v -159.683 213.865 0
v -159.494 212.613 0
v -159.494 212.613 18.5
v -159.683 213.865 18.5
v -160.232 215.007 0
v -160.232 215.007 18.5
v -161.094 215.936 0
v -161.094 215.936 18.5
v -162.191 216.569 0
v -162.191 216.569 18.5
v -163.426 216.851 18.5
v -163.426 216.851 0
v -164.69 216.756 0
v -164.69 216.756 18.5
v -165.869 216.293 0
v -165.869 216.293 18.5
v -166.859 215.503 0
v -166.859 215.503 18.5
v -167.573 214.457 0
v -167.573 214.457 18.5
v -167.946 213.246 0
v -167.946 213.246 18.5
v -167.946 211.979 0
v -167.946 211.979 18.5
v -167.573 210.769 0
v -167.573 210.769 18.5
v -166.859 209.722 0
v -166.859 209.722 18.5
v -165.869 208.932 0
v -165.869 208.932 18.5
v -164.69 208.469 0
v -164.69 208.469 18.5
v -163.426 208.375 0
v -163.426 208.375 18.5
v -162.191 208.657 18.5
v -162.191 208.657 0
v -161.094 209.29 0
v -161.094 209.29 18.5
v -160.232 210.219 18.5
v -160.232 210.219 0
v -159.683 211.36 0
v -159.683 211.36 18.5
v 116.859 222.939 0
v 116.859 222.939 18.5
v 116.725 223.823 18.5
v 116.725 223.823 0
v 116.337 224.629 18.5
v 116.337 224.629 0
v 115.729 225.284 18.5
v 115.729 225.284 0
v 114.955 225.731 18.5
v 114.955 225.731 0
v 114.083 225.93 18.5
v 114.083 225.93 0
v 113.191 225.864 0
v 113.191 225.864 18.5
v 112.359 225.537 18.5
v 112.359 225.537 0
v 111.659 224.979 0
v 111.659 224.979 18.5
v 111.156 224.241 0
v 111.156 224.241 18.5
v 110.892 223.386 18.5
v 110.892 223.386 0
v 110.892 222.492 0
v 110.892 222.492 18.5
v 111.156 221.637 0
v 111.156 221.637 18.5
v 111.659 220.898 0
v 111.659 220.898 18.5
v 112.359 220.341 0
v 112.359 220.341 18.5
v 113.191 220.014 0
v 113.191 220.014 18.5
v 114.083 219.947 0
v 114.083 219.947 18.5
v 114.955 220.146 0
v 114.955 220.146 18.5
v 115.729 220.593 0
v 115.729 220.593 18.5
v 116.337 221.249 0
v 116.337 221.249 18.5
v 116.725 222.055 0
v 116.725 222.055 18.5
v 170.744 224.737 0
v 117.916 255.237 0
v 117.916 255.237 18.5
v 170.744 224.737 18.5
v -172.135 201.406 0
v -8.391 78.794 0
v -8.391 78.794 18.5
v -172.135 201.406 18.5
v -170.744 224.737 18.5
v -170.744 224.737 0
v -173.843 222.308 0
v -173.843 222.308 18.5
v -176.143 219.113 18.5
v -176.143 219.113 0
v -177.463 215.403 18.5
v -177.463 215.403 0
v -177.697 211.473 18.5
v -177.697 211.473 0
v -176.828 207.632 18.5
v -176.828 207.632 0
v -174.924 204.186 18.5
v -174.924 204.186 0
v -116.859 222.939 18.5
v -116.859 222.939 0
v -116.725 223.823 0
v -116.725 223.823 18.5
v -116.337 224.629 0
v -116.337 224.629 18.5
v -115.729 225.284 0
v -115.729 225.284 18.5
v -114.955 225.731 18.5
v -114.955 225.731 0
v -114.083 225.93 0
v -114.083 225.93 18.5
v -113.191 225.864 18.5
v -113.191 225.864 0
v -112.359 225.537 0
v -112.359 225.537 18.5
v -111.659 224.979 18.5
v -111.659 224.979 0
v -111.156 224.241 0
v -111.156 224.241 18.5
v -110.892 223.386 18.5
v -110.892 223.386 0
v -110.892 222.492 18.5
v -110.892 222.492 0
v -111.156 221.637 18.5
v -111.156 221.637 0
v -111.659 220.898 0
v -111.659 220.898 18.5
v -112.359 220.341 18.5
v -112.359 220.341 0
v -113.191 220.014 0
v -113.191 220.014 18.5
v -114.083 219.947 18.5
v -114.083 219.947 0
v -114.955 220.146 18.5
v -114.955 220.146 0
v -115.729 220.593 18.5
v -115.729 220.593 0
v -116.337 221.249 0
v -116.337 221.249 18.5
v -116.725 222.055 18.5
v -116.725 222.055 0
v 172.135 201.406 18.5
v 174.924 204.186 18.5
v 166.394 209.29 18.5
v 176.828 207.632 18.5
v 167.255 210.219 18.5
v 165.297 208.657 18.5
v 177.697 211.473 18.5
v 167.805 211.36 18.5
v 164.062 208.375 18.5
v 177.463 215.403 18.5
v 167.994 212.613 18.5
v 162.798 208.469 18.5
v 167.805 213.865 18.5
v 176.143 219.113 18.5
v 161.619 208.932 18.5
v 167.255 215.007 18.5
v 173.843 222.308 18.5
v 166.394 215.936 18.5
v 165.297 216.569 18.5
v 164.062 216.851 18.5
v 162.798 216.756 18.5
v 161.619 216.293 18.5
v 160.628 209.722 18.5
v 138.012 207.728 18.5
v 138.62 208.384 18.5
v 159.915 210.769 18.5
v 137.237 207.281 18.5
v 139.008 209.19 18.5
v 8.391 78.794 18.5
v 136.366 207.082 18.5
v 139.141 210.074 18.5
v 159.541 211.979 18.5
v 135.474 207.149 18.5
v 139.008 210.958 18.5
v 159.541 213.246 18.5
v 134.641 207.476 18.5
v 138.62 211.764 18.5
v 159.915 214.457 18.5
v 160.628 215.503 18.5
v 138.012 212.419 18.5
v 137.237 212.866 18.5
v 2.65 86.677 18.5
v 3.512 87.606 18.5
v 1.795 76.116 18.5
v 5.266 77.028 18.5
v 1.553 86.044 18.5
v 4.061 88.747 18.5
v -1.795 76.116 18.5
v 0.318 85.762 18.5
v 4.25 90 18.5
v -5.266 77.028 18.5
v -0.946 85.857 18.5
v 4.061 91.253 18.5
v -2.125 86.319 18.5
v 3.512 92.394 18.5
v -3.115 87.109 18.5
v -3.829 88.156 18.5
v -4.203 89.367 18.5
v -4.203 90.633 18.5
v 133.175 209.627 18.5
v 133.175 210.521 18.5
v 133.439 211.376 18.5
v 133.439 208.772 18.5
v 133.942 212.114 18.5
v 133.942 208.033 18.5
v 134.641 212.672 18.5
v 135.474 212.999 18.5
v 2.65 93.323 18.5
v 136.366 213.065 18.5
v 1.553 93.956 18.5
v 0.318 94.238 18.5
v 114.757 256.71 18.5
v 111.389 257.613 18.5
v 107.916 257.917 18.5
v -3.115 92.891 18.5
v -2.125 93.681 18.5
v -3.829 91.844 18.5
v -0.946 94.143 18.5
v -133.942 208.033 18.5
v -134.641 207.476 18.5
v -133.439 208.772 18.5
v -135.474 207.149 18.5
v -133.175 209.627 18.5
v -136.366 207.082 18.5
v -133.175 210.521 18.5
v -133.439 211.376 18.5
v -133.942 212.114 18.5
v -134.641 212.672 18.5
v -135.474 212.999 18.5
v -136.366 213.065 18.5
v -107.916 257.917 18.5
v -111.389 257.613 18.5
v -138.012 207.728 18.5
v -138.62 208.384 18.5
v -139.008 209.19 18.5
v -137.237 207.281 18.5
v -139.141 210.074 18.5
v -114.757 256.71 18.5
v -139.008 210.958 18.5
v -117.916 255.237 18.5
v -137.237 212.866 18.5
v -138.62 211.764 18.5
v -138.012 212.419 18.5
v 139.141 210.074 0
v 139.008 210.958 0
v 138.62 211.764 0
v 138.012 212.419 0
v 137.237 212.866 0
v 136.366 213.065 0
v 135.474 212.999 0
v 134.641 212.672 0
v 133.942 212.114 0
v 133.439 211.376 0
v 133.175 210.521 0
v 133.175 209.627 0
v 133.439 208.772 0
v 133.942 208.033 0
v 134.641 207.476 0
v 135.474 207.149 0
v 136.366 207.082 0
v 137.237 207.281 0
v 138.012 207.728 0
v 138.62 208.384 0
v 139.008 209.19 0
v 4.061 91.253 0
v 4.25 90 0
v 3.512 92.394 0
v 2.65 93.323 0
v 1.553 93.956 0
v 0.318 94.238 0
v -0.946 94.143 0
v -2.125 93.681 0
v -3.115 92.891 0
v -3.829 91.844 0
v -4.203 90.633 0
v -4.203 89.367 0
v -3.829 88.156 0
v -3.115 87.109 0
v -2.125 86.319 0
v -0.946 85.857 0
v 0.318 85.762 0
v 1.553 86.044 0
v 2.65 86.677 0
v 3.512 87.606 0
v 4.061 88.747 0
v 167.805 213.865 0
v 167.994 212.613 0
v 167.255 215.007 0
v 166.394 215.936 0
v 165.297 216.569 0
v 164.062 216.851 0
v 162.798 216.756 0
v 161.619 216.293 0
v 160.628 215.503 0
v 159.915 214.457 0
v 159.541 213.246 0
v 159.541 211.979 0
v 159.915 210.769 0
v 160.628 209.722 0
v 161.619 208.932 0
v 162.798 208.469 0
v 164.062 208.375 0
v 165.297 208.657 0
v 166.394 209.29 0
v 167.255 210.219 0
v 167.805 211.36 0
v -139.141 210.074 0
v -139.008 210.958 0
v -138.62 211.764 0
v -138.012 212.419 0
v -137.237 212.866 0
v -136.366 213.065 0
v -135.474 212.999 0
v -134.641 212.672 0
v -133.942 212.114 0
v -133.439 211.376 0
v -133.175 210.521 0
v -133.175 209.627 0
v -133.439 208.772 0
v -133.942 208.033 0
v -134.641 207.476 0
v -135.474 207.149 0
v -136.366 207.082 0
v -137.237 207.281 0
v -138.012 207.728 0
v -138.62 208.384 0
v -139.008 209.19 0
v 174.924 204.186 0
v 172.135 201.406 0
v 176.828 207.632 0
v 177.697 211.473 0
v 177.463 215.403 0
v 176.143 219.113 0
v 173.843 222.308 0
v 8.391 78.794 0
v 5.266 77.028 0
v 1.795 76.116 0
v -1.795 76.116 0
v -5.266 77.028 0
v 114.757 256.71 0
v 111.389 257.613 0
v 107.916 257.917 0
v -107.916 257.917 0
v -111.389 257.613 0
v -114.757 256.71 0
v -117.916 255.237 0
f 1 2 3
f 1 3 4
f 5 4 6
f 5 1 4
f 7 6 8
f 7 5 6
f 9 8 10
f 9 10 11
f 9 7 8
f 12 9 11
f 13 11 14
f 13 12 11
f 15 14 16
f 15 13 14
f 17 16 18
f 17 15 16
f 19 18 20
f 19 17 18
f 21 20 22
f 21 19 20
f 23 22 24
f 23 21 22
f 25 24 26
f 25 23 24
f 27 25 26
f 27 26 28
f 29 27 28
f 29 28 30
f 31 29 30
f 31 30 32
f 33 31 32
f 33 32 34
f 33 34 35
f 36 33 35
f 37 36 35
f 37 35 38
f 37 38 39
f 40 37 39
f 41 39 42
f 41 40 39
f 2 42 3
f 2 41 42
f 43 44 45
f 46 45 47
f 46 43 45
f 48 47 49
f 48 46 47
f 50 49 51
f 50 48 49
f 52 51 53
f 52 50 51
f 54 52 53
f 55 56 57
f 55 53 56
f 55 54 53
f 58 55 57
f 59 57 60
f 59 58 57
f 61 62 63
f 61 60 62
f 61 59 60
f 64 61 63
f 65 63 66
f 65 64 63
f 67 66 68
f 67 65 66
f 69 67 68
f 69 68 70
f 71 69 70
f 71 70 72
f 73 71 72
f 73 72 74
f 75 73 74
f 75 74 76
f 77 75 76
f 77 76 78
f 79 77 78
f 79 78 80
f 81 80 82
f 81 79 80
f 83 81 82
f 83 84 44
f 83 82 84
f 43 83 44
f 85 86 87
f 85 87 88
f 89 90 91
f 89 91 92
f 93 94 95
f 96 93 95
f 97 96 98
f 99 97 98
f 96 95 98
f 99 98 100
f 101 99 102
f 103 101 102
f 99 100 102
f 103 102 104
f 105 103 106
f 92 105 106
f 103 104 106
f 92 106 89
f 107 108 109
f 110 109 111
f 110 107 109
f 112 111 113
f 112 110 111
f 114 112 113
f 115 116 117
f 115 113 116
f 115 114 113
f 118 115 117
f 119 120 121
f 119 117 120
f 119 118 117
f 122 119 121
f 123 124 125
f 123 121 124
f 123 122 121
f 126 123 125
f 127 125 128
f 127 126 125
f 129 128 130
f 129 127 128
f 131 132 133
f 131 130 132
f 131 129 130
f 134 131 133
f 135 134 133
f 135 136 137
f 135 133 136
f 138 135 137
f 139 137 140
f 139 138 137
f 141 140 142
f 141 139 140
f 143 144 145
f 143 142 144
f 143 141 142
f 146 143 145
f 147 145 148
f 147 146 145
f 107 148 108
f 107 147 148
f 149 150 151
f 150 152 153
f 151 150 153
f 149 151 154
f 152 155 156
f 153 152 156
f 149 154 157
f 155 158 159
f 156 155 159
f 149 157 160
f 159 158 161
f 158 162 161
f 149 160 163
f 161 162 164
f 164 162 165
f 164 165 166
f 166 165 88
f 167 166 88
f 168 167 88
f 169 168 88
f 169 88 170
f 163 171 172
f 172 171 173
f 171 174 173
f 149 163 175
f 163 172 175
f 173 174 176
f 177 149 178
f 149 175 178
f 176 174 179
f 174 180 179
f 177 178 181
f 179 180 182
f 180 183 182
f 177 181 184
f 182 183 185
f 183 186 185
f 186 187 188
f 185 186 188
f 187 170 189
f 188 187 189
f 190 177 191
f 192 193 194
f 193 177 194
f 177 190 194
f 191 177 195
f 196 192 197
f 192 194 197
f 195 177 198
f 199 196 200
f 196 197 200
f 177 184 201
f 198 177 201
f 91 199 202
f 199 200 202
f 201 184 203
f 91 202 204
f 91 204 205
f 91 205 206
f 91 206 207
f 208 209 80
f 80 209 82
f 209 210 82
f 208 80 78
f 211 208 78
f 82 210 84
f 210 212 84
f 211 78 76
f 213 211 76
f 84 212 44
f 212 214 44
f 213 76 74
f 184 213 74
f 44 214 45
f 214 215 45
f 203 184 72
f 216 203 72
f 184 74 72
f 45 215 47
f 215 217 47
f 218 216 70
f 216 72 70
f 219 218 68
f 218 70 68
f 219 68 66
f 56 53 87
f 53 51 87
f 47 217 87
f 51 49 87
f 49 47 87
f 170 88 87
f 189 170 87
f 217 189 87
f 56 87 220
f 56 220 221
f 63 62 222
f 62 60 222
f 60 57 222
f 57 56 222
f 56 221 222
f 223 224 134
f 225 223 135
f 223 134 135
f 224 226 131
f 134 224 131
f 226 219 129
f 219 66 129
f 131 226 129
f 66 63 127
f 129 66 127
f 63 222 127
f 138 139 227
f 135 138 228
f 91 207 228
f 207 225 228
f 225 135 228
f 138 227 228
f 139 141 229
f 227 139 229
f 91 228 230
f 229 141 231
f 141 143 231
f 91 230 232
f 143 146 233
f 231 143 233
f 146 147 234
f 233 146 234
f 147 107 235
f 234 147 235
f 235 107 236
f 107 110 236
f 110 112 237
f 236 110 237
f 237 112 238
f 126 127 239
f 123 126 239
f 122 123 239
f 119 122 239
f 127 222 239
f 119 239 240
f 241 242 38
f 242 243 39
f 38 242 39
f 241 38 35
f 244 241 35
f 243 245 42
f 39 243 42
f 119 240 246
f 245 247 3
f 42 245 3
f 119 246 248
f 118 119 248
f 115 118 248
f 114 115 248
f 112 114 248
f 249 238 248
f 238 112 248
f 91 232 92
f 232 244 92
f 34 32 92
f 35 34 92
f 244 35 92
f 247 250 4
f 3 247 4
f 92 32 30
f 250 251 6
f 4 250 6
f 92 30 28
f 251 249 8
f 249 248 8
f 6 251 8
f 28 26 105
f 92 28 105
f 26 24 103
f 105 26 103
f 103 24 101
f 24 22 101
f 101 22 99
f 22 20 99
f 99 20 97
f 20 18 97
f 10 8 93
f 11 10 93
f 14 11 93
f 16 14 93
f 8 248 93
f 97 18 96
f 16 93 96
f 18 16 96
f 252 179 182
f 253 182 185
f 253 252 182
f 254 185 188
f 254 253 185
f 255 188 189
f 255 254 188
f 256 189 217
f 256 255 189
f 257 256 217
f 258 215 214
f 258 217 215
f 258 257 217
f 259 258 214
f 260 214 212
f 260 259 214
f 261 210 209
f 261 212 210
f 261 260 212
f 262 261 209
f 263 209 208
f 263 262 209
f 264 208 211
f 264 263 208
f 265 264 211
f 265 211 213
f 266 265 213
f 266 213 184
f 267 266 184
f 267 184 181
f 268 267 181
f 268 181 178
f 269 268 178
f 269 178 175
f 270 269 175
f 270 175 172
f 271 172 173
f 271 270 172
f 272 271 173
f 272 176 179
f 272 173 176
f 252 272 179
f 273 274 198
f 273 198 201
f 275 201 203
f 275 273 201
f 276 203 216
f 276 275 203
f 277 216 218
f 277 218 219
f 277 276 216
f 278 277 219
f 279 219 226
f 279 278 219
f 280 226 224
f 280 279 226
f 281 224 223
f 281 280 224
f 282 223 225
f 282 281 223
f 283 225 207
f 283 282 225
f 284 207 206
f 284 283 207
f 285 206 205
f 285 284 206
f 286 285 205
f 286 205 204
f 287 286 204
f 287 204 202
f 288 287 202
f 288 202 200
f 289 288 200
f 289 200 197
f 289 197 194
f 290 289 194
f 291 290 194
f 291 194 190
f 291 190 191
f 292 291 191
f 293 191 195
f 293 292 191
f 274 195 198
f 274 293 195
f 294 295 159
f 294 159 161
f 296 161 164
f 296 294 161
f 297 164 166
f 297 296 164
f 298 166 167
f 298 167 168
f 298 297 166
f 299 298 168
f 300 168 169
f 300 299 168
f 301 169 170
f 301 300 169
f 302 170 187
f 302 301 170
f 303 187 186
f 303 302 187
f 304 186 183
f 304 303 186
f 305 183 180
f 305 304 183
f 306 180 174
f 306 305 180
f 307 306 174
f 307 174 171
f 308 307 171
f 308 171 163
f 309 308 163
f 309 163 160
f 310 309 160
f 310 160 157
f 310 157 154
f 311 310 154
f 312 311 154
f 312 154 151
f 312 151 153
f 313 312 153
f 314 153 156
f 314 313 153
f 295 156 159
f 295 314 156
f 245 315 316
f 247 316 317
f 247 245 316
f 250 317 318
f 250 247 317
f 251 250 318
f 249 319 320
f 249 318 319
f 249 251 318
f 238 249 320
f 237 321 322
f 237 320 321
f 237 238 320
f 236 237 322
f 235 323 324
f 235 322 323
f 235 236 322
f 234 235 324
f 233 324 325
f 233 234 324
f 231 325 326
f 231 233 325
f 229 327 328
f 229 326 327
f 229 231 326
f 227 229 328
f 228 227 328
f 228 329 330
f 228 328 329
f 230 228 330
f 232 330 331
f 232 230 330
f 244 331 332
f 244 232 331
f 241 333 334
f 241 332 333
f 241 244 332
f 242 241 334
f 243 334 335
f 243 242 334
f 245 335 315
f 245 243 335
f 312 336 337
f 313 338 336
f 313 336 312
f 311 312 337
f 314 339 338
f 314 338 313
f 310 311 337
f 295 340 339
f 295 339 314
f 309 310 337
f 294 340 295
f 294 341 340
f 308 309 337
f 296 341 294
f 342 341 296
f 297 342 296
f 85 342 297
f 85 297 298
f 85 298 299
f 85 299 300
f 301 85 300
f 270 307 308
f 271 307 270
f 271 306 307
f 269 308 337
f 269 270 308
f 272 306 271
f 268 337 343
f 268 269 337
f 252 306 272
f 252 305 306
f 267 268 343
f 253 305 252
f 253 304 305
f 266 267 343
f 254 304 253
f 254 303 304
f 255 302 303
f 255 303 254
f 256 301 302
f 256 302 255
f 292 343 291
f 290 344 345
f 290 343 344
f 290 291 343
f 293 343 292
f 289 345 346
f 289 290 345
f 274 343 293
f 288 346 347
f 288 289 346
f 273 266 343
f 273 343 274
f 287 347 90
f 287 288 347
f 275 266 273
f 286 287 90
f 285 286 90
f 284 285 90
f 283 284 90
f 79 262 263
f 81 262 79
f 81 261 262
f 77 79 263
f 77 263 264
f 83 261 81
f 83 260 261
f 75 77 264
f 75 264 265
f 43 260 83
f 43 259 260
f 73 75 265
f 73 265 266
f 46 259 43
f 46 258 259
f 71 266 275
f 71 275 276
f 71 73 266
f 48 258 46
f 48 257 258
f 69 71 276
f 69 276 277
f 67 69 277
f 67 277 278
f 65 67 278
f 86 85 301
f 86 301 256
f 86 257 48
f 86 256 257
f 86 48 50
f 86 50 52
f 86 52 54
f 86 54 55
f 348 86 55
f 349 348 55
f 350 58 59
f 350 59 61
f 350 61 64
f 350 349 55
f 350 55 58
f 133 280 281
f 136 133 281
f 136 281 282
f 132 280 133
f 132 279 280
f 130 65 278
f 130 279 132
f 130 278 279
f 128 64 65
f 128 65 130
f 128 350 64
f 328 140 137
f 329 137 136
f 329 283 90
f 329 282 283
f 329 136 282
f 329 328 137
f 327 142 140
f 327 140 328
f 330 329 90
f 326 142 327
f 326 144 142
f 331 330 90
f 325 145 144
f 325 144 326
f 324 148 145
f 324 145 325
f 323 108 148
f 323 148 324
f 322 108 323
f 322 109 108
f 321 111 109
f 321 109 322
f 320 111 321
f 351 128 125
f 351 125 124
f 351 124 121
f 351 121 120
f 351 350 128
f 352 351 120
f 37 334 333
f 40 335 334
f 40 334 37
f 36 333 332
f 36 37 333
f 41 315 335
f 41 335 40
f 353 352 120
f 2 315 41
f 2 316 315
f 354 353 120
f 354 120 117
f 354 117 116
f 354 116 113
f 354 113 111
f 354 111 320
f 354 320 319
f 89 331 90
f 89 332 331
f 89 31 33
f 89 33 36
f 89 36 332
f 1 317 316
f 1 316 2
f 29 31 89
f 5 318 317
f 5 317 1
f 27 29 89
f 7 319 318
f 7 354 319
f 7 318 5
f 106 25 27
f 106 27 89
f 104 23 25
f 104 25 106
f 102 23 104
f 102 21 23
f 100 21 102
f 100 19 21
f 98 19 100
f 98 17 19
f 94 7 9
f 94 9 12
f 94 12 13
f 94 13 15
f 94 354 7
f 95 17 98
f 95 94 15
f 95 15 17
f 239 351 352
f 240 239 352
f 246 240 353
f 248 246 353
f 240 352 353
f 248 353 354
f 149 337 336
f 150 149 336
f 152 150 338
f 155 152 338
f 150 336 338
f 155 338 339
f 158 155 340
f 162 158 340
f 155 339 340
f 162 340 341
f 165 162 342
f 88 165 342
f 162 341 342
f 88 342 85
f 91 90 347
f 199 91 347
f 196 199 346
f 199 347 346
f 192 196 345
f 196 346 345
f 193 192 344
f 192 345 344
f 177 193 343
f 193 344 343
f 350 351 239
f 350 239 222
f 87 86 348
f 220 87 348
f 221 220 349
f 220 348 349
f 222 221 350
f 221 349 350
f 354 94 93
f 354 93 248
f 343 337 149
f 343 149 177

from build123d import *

# Parameters (mm, degrees)
SKETCH_R          = 4.25
PAD_DEPTH         = 18.5
SKETCH001_R       = 3
POCKET_DEPTH      = 799.519554
POCKET_DEPTH_BACK = 818.019554


with BuildPart() as part:
    # Sketch → Pad (new body)
    with BuildSketch(Plane.XY):
        with BuildLine():
            Line((-170.743902, 224.737113), (-117.916352, 255.237113))
            ThreePointArc((-107.916352, 257.916605), (-113.092733, 257.235122), (-117.916352, 255.237113))
            Line((-107.916352, 257.916605), (107.916352, 257.916605))
            ThreePointArc((117.916352, 255.237113), (113.092733, 257.235122), (107.916352, 257.916605))
            Line((117.916352, 255.237113), (170.743902, 224.737113))
            ThreePointArc((172.135351, 201.406349), (177.719069, 213.446238), (170.743902, 224.737113))
            Line((172.135351, 201.406349), (8.391449, 78.793592))
            ThreePointArc((-8.391449, 78.793592), (0, 76), (8.391449, 78.793592))
            Line((-8.391449, 78.793592), (-172.135351, 201.406349))
            ThreePointArc((-170.743902, 224.737113), (-177.719069, 213.446238), (-172.135351, 201.406349))
        make_face()
        with Locations((163.743902, 212.612757)):
            Circle(SKETCH_R, mode=Mode.SUBTRACT)
        with Locations((-163.743902, 212.612757)):
            Circle(SKETCH_R, mode=Mode.SUBTRACT)
        with Locations((0, 90)):
            Circle(SKETCH_R, mode=Mode.SUBTRACT)
    extrude(amount=PAD_DEPTH)

    # Sketch001 → Pocket (cut, two sides)
    with BuildSketch(Plane.XY) as pocket_sk:
        with Locations((113.858583, 222.938851)):
            Circle(SKETCH001_R)
        with Locations((136.141417, 210.073851)):
            Circle(SKETCH001_R)
    pocket = extrude(amount=-POCKET_DEPTH, mode=Mode.SUBTRACT) + extrude(pocket_sk.sketch, amount=POCKET_DEPTH_BACK, mode=Mode.SUBTRACT)

    # Mirrored: Pocket across Sketch001 V_Axis
    add(pocket.mirror(Plane(origin=(0, 0, 0), x_dir=(0, 0, 1), z_dir=(1, 0, 0))), mode=Mode.SUBTRACT)


solid = part.part
